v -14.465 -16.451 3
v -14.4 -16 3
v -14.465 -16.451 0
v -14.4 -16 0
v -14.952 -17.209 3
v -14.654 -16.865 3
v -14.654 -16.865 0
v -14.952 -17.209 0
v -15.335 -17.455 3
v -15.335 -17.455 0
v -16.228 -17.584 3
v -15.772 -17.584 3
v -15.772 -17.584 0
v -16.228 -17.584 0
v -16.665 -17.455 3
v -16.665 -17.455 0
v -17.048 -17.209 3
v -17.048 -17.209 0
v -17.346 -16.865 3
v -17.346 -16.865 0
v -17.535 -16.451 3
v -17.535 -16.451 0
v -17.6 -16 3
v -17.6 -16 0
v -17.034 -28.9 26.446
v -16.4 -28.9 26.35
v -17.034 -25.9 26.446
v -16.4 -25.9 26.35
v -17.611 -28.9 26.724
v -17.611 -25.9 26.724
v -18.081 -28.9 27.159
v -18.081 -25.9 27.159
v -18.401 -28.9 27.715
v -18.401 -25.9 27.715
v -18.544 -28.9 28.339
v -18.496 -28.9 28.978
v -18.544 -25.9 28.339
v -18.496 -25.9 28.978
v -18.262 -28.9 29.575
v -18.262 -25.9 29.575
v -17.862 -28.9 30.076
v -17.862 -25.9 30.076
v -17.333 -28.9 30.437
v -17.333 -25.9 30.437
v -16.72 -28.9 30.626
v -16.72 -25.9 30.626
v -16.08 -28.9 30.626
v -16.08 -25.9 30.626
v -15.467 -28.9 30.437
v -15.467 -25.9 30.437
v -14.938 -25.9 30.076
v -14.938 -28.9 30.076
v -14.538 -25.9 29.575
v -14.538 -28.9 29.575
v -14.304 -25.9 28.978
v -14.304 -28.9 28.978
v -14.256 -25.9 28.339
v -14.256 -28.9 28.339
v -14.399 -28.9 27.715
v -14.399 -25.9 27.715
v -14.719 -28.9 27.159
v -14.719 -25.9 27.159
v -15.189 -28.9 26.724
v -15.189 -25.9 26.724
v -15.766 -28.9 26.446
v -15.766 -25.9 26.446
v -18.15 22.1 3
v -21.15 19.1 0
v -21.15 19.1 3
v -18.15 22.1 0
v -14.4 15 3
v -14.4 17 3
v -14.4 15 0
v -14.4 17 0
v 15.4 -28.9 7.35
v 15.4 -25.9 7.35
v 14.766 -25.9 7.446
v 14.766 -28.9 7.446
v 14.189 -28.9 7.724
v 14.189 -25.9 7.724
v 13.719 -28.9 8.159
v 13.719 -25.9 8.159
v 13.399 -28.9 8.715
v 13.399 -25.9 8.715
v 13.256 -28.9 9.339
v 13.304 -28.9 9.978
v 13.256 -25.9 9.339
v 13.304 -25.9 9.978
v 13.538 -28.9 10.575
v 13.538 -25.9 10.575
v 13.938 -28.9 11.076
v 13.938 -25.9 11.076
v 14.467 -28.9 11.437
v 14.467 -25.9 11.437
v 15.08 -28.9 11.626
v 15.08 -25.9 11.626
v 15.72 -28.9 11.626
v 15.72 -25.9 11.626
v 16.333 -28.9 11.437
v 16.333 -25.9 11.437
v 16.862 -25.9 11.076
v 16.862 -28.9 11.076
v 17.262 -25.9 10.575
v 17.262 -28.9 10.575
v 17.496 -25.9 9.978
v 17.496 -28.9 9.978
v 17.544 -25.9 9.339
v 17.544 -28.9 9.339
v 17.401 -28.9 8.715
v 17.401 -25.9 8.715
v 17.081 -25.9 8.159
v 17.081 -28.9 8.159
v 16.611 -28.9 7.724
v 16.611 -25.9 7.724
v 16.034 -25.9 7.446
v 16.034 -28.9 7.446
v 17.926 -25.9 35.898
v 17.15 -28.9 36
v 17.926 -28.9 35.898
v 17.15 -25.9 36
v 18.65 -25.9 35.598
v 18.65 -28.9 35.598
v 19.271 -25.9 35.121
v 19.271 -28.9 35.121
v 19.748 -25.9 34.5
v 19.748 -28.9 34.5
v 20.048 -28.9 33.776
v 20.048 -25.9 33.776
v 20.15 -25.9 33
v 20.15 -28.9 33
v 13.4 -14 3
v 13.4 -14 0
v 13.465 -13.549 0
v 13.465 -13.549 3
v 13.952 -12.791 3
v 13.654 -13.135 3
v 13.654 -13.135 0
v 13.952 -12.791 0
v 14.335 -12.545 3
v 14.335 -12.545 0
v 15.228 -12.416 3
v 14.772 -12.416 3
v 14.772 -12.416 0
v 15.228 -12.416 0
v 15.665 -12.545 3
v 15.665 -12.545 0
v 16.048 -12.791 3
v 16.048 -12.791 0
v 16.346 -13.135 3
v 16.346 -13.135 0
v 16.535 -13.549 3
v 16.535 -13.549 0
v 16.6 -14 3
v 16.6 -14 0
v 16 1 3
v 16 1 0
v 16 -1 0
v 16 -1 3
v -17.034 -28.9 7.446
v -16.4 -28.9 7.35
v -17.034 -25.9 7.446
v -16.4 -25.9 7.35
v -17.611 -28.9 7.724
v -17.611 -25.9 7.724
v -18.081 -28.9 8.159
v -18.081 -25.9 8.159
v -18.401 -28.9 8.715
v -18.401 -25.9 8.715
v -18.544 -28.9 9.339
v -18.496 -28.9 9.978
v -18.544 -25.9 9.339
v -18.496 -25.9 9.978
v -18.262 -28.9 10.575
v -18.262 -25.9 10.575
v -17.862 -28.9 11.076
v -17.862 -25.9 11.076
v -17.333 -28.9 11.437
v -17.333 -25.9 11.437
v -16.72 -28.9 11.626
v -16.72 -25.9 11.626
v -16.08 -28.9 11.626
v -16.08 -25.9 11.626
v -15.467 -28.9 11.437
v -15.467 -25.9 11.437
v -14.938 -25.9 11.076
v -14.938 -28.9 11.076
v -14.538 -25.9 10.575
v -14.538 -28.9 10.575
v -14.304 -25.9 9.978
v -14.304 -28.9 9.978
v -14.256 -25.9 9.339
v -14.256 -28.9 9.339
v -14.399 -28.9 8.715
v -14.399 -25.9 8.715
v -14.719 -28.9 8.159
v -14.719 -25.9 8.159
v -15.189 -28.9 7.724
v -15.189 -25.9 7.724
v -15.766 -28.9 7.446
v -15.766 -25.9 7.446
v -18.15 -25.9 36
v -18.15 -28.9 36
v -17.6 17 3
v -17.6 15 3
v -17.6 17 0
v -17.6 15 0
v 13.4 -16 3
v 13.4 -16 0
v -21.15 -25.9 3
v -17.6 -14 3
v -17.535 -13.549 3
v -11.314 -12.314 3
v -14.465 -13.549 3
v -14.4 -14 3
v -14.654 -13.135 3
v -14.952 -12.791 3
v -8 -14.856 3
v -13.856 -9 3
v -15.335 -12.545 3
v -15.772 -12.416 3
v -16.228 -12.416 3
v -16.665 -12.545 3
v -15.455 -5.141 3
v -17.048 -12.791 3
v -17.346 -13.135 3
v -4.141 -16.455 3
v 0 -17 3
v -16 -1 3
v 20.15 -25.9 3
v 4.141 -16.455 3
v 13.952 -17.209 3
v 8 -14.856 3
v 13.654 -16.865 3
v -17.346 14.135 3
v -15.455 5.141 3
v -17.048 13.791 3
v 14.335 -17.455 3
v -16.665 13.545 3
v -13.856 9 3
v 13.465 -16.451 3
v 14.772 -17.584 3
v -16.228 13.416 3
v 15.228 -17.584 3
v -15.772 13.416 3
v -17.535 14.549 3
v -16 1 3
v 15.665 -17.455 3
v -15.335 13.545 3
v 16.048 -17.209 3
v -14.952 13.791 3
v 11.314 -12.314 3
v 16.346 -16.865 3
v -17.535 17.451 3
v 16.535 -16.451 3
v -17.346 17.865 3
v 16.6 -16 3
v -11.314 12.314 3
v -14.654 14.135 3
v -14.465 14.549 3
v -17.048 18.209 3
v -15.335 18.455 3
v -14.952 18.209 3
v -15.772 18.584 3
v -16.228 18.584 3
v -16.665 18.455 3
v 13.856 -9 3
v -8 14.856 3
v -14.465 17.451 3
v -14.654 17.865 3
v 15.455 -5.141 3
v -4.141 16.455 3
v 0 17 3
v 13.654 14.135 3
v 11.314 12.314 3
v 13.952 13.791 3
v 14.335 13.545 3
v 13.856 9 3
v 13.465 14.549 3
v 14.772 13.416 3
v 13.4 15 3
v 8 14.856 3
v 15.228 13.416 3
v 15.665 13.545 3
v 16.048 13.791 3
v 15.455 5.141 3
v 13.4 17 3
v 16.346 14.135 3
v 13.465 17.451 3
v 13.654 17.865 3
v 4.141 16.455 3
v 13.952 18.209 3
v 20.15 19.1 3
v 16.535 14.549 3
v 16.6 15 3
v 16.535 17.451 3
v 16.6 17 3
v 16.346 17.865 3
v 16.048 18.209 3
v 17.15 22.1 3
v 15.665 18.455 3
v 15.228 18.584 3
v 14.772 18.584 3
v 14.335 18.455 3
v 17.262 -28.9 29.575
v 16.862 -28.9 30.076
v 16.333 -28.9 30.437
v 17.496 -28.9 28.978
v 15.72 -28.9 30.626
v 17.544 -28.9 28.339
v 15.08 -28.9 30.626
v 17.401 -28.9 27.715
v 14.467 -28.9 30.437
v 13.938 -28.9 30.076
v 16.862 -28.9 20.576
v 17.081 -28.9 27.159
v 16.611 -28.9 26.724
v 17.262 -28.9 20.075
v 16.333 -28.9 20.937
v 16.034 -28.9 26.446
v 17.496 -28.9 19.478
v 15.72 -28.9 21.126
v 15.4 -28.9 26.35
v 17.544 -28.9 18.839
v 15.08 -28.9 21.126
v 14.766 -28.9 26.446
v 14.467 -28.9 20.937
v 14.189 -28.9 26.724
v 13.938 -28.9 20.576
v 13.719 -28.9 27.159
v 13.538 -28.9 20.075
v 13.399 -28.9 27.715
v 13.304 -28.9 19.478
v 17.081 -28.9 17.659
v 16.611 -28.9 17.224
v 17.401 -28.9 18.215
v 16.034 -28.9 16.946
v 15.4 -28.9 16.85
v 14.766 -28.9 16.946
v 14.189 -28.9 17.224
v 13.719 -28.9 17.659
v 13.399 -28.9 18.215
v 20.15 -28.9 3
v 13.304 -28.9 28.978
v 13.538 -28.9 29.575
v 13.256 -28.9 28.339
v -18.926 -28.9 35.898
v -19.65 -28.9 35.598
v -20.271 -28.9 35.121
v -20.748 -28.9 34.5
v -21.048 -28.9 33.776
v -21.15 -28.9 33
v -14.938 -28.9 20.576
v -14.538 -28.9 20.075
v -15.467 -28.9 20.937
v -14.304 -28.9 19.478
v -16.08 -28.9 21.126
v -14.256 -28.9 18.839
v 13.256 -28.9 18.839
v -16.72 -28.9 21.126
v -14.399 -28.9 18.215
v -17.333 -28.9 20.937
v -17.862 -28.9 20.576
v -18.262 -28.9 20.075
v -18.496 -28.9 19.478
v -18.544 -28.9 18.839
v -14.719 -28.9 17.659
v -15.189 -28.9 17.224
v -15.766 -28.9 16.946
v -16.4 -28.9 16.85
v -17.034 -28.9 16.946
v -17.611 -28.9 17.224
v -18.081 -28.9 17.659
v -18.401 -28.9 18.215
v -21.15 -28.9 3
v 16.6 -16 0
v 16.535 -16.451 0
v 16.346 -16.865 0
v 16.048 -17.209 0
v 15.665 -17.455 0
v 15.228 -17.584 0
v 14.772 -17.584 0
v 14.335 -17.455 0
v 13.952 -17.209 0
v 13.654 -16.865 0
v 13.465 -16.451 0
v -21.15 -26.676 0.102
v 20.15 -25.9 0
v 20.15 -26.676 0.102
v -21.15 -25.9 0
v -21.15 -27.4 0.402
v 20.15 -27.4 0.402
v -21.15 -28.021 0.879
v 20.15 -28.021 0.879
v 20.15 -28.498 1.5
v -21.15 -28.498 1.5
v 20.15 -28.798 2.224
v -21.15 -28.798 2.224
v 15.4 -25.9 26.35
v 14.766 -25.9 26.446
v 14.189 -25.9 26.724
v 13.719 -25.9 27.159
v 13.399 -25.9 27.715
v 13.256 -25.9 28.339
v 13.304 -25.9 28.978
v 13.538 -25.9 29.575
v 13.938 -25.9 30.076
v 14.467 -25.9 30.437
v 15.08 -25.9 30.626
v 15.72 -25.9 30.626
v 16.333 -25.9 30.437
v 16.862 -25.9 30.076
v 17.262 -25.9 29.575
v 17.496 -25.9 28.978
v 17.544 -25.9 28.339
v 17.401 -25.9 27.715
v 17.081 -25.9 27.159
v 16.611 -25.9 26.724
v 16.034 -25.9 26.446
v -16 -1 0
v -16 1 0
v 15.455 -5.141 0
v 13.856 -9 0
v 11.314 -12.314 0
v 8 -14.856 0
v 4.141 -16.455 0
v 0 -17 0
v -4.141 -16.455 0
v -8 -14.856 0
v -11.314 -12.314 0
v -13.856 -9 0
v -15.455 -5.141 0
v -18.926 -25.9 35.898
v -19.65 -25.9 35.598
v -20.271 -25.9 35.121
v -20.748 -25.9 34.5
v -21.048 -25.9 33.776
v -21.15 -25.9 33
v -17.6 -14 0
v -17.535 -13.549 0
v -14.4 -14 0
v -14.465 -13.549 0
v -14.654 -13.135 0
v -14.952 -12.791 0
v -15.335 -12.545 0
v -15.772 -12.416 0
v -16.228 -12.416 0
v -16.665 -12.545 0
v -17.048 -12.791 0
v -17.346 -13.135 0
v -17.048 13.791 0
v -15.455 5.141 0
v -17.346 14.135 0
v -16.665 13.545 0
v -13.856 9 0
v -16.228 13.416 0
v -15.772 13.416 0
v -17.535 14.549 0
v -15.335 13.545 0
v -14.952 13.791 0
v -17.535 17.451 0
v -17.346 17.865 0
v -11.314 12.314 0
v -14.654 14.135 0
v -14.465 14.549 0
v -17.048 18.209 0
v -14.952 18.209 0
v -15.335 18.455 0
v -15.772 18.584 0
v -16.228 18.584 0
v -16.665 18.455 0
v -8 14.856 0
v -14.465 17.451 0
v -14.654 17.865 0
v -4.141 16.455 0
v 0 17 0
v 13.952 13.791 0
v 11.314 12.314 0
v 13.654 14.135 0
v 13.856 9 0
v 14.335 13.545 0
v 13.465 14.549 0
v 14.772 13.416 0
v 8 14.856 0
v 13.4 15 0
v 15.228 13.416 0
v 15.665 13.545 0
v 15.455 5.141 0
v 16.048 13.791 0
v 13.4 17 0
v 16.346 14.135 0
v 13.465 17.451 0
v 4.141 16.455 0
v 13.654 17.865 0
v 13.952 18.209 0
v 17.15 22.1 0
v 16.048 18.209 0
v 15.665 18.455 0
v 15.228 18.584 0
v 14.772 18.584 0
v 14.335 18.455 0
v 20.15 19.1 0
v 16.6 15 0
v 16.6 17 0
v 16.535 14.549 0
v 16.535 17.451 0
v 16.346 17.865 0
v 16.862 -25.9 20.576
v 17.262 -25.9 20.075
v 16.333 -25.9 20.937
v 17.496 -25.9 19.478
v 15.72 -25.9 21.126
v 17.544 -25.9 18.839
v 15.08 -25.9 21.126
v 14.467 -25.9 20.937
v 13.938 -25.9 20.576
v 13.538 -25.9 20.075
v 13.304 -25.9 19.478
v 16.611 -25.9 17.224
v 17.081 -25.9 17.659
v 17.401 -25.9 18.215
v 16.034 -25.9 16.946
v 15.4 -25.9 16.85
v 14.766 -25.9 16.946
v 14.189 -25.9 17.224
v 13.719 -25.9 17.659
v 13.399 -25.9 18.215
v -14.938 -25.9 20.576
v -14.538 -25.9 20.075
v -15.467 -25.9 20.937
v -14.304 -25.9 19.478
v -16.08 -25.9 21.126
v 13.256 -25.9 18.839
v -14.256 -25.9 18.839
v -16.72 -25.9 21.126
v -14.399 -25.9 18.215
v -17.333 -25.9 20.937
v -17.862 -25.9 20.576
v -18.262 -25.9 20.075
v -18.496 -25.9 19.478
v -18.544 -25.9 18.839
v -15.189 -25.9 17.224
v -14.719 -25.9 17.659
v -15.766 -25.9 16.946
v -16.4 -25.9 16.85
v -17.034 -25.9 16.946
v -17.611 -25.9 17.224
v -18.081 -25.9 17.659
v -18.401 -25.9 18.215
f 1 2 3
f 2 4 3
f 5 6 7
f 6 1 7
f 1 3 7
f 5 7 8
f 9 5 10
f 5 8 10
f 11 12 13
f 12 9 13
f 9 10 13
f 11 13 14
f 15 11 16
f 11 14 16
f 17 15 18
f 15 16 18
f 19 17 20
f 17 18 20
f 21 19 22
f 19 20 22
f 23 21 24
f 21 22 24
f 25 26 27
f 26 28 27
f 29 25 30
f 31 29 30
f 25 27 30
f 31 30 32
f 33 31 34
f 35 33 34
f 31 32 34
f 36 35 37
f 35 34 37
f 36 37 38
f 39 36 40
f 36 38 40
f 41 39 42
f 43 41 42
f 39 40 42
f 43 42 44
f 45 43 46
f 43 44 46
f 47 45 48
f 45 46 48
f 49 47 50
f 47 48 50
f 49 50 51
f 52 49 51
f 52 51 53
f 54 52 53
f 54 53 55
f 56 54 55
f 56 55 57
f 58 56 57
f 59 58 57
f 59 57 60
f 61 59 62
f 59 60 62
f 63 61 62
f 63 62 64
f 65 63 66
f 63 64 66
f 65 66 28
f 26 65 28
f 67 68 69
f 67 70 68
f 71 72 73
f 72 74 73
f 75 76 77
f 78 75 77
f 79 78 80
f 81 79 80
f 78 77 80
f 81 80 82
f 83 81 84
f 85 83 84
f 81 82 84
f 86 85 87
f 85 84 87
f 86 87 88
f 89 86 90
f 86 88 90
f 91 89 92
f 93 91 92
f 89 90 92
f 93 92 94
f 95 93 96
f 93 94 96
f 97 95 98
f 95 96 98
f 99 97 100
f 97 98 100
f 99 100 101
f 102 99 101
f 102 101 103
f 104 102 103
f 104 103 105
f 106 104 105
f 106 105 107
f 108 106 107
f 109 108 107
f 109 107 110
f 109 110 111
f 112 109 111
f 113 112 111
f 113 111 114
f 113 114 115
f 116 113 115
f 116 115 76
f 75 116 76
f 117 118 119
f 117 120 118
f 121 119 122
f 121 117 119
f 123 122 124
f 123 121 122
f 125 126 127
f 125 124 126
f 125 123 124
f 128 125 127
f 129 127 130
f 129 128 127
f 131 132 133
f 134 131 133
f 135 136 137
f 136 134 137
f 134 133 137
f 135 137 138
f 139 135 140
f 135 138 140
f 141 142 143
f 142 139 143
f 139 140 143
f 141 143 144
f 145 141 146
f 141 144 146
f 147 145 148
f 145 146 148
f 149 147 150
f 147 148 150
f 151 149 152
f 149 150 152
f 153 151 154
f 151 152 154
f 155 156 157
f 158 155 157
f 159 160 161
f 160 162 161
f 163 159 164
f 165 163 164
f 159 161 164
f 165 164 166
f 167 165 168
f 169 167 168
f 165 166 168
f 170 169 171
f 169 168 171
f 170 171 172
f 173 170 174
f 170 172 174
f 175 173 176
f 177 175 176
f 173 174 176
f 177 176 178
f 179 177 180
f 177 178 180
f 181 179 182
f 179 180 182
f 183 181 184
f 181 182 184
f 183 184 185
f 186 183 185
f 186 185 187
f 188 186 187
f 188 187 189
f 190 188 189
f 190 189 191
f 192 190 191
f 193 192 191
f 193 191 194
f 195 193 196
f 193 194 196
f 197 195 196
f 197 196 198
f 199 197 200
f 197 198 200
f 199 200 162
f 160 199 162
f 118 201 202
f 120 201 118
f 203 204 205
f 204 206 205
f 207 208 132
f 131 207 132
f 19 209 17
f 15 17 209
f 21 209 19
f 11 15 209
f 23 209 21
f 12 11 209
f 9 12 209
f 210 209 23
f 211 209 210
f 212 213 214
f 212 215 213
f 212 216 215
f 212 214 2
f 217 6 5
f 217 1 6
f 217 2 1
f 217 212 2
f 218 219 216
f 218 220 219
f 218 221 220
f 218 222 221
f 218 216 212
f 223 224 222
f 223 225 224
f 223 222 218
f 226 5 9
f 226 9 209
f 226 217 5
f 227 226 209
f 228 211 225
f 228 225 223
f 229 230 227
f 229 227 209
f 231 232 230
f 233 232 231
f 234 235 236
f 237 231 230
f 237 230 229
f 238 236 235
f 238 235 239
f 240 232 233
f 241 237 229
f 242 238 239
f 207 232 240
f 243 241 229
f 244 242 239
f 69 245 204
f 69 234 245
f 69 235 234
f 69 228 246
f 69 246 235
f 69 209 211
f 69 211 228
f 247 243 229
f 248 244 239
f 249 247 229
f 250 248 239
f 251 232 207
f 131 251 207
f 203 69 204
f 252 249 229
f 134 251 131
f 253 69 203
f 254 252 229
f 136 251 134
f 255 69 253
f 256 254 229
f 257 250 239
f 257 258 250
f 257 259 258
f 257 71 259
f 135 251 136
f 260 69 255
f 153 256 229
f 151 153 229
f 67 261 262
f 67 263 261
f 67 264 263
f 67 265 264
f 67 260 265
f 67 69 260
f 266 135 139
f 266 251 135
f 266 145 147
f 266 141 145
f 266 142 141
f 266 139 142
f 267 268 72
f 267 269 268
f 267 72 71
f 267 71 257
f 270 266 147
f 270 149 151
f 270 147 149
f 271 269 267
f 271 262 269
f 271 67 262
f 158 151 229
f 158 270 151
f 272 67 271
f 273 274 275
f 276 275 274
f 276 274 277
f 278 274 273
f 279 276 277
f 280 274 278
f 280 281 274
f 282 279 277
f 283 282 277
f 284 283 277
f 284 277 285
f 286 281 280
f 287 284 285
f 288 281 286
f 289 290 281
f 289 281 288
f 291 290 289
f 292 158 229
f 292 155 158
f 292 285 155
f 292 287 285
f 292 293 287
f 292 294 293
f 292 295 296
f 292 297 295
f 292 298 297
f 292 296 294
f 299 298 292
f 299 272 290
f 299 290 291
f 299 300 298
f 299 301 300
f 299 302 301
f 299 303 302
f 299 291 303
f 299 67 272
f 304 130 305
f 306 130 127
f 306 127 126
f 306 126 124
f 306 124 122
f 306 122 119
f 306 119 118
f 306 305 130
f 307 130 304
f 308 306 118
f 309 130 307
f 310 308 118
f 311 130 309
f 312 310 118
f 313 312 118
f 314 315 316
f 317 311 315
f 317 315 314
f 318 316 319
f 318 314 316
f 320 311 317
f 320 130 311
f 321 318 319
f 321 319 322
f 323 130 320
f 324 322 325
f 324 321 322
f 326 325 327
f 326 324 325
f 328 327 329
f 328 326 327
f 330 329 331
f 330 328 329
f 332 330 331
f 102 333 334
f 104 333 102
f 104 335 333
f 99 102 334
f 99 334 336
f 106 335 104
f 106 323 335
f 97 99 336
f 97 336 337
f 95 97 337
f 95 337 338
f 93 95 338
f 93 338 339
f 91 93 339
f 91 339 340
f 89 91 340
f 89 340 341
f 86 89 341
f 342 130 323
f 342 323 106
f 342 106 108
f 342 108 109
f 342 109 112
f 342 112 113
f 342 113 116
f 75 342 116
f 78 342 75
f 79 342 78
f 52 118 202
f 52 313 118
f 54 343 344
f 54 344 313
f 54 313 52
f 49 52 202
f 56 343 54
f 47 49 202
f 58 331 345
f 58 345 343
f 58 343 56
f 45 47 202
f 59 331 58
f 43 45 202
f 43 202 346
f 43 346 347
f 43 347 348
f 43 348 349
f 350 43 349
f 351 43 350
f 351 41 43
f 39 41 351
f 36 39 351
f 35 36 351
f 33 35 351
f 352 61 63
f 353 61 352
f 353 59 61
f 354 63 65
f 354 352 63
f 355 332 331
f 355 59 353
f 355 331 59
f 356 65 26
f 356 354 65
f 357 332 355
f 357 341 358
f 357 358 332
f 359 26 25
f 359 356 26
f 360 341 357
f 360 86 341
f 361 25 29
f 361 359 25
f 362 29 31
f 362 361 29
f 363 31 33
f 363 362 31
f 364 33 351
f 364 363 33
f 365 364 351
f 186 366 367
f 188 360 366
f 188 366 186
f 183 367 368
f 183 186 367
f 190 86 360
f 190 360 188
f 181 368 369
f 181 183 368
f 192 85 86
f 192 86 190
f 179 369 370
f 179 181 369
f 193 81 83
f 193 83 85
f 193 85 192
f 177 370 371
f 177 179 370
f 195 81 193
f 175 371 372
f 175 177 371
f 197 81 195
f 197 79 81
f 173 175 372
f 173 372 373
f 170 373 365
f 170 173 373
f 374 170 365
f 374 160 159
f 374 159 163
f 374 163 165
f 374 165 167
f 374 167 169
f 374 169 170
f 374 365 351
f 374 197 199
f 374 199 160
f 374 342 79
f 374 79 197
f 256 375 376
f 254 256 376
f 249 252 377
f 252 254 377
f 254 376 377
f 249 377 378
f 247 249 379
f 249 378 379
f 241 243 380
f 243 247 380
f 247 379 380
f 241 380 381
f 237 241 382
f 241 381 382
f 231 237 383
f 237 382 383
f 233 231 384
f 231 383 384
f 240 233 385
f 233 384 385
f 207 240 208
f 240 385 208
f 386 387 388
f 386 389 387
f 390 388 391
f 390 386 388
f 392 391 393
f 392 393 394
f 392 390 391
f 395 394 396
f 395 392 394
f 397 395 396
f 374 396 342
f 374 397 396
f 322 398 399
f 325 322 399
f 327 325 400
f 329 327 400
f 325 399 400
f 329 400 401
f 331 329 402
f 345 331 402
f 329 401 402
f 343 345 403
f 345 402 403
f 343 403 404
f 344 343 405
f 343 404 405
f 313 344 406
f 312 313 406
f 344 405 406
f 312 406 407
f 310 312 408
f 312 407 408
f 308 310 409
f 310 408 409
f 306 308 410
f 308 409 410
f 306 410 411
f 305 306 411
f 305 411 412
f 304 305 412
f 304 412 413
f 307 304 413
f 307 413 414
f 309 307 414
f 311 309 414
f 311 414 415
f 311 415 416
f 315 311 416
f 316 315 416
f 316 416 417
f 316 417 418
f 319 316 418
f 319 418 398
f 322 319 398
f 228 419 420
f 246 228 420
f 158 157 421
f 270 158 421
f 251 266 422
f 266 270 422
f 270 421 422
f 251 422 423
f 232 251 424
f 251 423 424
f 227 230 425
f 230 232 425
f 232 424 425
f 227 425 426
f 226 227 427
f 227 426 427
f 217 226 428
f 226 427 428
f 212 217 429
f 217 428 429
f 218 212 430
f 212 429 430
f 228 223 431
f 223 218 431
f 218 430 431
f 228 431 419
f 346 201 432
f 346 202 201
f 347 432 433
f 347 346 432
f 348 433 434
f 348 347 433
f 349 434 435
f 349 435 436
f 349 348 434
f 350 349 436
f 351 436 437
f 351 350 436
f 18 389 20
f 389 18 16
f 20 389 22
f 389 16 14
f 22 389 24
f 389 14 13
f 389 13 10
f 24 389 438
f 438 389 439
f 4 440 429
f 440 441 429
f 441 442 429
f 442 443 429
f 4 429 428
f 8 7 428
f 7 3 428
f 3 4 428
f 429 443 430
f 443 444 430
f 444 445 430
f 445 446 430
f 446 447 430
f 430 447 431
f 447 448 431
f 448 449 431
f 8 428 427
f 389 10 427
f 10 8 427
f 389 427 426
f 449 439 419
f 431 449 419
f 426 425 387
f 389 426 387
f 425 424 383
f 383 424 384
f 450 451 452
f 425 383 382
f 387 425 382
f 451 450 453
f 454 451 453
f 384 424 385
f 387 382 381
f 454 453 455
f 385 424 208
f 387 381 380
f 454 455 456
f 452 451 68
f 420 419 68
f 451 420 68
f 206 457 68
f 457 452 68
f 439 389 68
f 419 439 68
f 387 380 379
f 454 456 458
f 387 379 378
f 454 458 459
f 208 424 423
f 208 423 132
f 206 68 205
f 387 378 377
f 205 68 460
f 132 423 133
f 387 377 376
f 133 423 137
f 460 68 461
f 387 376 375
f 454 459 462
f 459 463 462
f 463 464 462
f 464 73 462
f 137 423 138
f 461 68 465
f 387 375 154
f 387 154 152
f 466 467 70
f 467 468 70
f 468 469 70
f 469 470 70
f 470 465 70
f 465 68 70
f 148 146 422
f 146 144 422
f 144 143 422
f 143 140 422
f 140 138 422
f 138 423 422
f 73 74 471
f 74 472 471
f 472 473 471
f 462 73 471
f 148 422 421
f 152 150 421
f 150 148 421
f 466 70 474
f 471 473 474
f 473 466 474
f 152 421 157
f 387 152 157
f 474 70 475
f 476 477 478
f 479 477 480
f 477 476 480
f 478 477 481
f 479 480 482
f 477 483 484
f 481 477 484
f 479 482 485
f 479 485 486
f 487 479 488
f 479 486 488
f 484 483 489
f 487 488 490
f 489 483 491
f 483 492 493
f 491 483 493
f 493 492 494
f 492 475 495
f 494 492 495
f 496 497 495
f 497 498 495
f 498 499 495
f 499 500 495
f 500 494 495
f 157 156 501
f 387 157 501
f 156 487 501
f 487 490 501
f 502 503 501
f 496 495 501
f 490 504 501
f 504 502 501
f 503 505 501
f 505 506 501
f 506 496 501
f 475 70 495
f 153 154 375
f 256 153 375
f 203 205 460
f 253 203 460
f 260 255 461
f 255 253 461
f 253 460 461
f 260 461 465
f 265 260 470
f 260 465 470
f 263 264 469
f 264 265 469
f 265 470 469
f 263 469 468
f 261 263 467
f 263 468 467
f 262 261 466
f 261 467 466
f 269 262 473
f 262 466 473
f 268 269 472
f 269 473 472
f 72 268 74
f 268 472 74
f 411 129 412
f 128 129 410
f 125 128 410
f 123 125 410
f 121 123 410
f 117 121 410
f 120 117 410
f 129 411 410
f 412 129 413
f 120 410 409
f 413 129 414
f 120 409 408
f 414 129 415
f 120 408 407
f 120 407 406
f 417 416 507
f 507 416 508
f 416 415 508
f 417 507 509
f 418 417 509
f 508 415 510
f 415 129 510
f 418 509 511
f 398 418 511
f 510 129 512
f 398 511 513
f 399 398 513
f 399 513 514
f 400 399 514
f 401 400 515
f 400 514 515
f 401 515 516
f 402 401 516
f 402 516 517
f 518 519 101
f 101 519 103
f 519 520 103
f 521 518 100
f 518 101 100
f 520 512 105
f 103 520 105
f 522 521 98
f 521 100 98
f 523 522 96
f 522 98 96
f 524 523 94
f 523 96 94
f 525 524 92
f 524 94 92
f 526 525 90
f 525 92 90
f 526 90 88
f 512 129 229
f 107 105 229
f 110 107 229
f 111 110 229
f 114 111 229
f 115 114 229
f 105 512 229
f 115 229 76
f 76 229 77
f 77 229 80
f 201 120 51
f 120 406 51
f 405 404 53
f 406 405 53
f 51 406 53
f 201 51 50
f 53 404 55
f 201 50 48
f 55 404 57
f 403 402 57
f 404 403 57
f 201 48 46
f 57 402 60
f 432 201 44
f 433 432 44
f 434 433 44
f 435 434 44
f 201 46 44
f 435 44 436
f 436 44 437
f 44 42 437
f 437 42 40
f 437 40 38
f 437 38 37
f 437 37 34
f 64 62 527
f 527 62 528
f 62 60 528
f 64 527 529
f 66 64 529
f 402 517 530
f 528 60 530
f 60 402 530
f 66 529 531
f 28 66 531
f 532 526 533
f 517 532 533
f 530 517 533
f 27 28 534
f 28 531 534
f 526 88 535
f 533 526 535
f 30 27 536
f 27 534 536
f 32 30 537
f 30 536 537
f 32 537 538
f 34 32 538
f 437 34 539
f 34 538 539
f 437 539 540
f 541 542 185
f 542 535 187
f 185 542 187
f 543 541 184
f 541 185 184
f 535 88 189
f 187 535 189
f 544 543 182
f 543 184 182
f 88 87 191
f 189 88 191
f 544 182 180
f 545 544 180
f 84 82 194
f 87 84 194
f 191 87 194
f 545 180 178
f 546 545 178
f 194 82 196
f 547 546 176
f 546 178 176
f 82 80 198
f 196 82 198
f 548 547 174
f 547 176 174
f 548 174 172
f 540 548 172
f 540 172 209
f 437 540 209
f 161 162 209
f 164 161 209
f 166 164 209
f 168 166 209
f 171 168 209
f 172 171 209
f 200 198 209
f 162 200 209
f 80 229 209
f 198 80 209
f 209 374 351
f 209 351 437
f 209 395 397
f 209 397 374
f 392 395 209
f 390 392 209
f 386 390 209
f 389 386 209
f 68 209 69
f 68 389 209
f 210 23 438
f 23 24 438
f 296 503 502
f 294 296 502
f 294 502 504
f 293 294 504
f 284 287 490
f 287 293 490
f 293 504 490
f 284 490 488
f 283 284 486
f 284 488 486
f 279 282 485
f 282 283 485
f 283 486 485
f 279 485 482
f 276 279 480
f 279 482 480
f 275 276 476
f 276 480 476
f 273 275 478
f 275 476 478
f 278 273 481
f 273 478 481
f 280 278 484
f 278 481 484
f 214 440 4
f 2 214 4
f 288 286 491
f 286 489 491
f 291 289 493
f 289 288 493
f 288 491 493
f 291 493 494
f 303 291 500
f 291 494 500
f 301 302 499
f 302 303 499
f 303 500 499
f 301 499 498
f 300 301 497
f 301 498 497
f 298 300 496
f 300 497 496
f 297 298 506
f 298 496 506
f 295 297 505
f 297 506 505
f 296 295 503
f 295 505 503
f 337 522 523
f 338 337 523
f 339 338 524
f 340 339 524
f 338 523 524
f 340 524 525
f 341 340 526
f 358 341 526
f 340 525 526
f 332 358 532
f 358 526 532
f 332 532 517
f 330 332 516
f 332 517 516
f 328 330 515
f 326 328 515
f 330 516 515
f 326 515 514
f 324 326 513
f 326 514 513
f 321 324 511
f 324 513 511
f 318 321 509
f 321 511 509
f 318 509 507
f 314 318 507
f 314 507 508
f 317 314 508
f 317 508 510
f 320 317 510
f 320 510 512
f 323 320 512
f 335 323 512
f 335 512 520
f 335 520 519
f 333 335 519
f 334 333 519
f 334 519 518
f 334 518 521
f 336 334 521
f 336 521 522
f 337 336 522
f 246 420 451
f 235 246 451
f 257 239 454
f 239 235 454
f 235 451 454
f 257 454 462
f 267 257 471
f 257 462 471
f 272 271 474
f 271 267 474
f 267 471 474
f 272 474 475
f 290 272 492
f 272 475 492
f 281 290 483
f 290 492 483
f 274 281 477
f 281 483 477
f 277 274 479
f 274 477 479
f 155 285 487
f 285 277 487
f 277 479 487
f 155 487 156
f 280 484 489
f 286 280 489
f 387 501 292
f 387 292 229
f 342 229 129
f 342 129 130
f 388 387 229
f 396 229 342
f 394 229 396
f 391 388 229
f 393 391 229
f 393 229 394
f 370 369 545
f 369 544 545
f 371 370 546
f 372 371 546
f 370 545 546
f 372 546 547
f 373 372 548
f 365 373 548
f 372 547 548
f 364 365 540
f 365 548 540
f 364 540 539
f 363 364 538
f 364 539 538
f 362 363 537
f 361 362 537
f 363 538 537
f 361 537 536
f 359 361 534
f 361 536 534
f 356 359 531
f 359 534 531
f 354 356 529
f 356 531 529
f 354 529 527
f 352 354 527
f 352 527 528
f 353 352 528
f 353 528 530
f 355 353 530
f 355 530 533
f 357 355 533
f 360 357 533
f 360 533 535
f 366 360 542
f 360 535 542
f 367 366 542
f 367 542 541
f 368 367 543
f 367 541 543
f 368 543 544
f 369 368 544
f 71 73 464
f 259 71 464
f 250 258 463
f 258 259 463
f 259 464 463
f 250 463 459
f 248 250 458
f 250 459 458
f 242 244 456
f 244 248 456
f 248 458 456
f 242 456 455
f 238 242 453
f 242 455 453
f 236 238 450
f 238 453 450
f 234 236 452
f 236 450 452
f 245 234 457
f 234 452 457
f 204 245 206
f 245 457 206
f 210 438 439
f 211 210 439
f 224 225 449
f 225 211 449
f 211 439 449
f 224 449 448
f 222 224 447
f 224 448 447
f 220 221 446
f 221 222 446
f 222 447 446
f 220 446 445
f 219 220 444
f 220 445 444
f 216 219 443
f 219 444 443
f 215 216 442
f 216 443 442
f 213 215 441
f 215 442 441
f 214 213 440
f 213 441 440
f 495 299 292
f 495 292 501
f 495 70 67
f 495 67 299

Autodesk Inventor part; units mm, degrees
ref_plane "YZ Plane" through (0, 0, 0) normal (1, 0, 0) x (0, 1, 0)
ref_plane "XZ Plane" through (0, 0, 0) normal (0, 1, 0) x (-1, 0, 0)
ref_plane "XY Plane" through (0, 0, 0) normal (0, 0, 1) x (1, 0, 0)
sketch "スケッチ1" plane through (0, 0, 0) normal (0, 0, 1) x (1, 0, 0)
  line L0 (20.15, -28.9) -> (-21.15, -28.9)
  line L1 (-21.15, -28.9) -> (-21.15, 22.1)
  line L2 (-21.15, 22.1) -> (20.15, 22.1)
  line L3 (20.15, 22.1) -> (20.15, -28.9)
  line L4 (-16, -1) -> (-16, 1)
  line L5 (16, 1) -> (16, -1)
  line L6 (16, -1) -> (-16, 1) construction
  line L7 (-16, -1) -> (16, 1) construction
  arc A0 (-16, -1) -> (16, -1) centre (0, -1) ccw
  arc A1 (16, 1) -> (-16, 1) centre (0, 1) ccw
  line L8 (-16, 1) -> (-15.8745, 1)
  line L9 (15.8745, 1) -> (16, 1)
  line L10 (16, -1) -> (15.8745, -1)
  line L11 (-15.8745, -1) -> (-16, -1)
  arc A2 (-14.4, 17) -> (-17.6, 17) centre (-16, 17) ccw
  line L12 (-14.4, 17) -> (-14.4, 15)
  line L13 (-17.6, 15) -> (-17.6, 17)
  arc A3 (-17.6, 15) -> (-14.4, 15) centre (-16, 15) ccw
  arc A4 (16.6, 17) -> (13.4, 17) centre (15, 17) ccw
  line L14 (13.4, 15) -> (13.4, 17)
  arc A5 (13.4, 15) -> (16.6, 15) centre (15, 15) ccw
  line L15 (16.6, 17) -> (16.6, 15)
  arc A6 (-14.4, -14) -> (-17.6, -14) centre (-16, -14) ccw
  line L16 (-17.6, -16) -> (-17.6, -14)
  arc A7 (-17.6, -16) -> (-14.4, -16) centre (-16, -16) ccw
  line L17 (-14.4, -14) -> (-14.4, -16)
  arc A8 (16.6, -14) -> (13.4, -14) centre (15, -14) ccw
  line L18 (13.4, -16) -> (13.4, -14)
  arc A9 (13.4, -16) -> (16.6, -16) centre (15, -16) ccw
  line L19 (16.6, -14) -> (16.6, -16)
  point P0 (0, 0)
  point P1 (13.4, -15)
  point P2 (16.6, -15)
  dimension "d5" = 41.3
  dimension "d6" = 51
  dimension "d7" = 2
  dimension "d9" = 16
  dimension "d12" = 2
  dimension "d13" = 1.6
  dimension "d14" = 1.6
  dimension "d17" = 31
  dimension "d20" = 31
  dimension "d29" = 5.15
  dimension "d30" = 14.9
extrude "押し出し1" add sketch "スケッチ1" along normal blind 3
sketch "スケッチ2" plane through (0, 0, 3) normal (0, 0, 1) x (1, 0, 0)
  line L0 (-21.15, -28.9) -> (20.15, -28.9) projected
  line L1 (-21.15, -28.9) -> (20.15, -28.9)
  line L2 (20.15, -28.9) -> (20.15, -25.9)
  line L3 (20.15, -25.9) -> (-21.15, -25.9)
  line L4 (-21.15, -25.9) -> (-21.15, -28.9)
  point P0 (0, 0)
  dimension "d25" = 3
extrude "押し出し2" add sketch "スケッチ2" along normal blind 33
sketch "スケッチ3" plane through (-21.15, -28.9, 0) normal (0, -1, 0) x (1, 0, 0)
  line L0 (4.75, 19) -> (36.55, 19)
  line L1 (36.55, 19) -> (36.55, 9.5)
  line L2 (36.55, 9.5) -> (4.75, 9.5)
  line L3 (4.75, 9.5) -> (4.75, 19)
  line L4 (0, 0) -> (41.3, 0) projected
  line L5 (41.3, 0) -> (41.3, 36) projected
  point P0 (21.15, 0)
  point P1 (36.55, 28.5)
  point P2 (4.75, 28.5)
  dimension "d31" = 9.5
  dimension "d32" = 9.5
  dimension "d33" = 31.8
  dimension "d34" = 4.75
  dimension "d42" = 28.5
hole "穴1" at (-16.4, -28.9, 9.5) at (-16.4, -28.9, 19) at (15.4, -28.9, 9.5) at (15.4, -28.9, 19) at (15.4, -28.9, 28.5) at (-16.4, -28.9, 28.5) direction (0, 1, 0) diameter 4.3 end through all
chamfer "面取り1" distance 3 angle 45 2 edges at (20.15, 22.1, 1.5) (-21.15, 22.1, 1.5)
fillet "フィレット1" radius 3 3 edges at (-21.15, -27.4, 36) (20.15, -27.4, 36) (-0.5, -28.9, 0)
properties part number "ブラケット"
